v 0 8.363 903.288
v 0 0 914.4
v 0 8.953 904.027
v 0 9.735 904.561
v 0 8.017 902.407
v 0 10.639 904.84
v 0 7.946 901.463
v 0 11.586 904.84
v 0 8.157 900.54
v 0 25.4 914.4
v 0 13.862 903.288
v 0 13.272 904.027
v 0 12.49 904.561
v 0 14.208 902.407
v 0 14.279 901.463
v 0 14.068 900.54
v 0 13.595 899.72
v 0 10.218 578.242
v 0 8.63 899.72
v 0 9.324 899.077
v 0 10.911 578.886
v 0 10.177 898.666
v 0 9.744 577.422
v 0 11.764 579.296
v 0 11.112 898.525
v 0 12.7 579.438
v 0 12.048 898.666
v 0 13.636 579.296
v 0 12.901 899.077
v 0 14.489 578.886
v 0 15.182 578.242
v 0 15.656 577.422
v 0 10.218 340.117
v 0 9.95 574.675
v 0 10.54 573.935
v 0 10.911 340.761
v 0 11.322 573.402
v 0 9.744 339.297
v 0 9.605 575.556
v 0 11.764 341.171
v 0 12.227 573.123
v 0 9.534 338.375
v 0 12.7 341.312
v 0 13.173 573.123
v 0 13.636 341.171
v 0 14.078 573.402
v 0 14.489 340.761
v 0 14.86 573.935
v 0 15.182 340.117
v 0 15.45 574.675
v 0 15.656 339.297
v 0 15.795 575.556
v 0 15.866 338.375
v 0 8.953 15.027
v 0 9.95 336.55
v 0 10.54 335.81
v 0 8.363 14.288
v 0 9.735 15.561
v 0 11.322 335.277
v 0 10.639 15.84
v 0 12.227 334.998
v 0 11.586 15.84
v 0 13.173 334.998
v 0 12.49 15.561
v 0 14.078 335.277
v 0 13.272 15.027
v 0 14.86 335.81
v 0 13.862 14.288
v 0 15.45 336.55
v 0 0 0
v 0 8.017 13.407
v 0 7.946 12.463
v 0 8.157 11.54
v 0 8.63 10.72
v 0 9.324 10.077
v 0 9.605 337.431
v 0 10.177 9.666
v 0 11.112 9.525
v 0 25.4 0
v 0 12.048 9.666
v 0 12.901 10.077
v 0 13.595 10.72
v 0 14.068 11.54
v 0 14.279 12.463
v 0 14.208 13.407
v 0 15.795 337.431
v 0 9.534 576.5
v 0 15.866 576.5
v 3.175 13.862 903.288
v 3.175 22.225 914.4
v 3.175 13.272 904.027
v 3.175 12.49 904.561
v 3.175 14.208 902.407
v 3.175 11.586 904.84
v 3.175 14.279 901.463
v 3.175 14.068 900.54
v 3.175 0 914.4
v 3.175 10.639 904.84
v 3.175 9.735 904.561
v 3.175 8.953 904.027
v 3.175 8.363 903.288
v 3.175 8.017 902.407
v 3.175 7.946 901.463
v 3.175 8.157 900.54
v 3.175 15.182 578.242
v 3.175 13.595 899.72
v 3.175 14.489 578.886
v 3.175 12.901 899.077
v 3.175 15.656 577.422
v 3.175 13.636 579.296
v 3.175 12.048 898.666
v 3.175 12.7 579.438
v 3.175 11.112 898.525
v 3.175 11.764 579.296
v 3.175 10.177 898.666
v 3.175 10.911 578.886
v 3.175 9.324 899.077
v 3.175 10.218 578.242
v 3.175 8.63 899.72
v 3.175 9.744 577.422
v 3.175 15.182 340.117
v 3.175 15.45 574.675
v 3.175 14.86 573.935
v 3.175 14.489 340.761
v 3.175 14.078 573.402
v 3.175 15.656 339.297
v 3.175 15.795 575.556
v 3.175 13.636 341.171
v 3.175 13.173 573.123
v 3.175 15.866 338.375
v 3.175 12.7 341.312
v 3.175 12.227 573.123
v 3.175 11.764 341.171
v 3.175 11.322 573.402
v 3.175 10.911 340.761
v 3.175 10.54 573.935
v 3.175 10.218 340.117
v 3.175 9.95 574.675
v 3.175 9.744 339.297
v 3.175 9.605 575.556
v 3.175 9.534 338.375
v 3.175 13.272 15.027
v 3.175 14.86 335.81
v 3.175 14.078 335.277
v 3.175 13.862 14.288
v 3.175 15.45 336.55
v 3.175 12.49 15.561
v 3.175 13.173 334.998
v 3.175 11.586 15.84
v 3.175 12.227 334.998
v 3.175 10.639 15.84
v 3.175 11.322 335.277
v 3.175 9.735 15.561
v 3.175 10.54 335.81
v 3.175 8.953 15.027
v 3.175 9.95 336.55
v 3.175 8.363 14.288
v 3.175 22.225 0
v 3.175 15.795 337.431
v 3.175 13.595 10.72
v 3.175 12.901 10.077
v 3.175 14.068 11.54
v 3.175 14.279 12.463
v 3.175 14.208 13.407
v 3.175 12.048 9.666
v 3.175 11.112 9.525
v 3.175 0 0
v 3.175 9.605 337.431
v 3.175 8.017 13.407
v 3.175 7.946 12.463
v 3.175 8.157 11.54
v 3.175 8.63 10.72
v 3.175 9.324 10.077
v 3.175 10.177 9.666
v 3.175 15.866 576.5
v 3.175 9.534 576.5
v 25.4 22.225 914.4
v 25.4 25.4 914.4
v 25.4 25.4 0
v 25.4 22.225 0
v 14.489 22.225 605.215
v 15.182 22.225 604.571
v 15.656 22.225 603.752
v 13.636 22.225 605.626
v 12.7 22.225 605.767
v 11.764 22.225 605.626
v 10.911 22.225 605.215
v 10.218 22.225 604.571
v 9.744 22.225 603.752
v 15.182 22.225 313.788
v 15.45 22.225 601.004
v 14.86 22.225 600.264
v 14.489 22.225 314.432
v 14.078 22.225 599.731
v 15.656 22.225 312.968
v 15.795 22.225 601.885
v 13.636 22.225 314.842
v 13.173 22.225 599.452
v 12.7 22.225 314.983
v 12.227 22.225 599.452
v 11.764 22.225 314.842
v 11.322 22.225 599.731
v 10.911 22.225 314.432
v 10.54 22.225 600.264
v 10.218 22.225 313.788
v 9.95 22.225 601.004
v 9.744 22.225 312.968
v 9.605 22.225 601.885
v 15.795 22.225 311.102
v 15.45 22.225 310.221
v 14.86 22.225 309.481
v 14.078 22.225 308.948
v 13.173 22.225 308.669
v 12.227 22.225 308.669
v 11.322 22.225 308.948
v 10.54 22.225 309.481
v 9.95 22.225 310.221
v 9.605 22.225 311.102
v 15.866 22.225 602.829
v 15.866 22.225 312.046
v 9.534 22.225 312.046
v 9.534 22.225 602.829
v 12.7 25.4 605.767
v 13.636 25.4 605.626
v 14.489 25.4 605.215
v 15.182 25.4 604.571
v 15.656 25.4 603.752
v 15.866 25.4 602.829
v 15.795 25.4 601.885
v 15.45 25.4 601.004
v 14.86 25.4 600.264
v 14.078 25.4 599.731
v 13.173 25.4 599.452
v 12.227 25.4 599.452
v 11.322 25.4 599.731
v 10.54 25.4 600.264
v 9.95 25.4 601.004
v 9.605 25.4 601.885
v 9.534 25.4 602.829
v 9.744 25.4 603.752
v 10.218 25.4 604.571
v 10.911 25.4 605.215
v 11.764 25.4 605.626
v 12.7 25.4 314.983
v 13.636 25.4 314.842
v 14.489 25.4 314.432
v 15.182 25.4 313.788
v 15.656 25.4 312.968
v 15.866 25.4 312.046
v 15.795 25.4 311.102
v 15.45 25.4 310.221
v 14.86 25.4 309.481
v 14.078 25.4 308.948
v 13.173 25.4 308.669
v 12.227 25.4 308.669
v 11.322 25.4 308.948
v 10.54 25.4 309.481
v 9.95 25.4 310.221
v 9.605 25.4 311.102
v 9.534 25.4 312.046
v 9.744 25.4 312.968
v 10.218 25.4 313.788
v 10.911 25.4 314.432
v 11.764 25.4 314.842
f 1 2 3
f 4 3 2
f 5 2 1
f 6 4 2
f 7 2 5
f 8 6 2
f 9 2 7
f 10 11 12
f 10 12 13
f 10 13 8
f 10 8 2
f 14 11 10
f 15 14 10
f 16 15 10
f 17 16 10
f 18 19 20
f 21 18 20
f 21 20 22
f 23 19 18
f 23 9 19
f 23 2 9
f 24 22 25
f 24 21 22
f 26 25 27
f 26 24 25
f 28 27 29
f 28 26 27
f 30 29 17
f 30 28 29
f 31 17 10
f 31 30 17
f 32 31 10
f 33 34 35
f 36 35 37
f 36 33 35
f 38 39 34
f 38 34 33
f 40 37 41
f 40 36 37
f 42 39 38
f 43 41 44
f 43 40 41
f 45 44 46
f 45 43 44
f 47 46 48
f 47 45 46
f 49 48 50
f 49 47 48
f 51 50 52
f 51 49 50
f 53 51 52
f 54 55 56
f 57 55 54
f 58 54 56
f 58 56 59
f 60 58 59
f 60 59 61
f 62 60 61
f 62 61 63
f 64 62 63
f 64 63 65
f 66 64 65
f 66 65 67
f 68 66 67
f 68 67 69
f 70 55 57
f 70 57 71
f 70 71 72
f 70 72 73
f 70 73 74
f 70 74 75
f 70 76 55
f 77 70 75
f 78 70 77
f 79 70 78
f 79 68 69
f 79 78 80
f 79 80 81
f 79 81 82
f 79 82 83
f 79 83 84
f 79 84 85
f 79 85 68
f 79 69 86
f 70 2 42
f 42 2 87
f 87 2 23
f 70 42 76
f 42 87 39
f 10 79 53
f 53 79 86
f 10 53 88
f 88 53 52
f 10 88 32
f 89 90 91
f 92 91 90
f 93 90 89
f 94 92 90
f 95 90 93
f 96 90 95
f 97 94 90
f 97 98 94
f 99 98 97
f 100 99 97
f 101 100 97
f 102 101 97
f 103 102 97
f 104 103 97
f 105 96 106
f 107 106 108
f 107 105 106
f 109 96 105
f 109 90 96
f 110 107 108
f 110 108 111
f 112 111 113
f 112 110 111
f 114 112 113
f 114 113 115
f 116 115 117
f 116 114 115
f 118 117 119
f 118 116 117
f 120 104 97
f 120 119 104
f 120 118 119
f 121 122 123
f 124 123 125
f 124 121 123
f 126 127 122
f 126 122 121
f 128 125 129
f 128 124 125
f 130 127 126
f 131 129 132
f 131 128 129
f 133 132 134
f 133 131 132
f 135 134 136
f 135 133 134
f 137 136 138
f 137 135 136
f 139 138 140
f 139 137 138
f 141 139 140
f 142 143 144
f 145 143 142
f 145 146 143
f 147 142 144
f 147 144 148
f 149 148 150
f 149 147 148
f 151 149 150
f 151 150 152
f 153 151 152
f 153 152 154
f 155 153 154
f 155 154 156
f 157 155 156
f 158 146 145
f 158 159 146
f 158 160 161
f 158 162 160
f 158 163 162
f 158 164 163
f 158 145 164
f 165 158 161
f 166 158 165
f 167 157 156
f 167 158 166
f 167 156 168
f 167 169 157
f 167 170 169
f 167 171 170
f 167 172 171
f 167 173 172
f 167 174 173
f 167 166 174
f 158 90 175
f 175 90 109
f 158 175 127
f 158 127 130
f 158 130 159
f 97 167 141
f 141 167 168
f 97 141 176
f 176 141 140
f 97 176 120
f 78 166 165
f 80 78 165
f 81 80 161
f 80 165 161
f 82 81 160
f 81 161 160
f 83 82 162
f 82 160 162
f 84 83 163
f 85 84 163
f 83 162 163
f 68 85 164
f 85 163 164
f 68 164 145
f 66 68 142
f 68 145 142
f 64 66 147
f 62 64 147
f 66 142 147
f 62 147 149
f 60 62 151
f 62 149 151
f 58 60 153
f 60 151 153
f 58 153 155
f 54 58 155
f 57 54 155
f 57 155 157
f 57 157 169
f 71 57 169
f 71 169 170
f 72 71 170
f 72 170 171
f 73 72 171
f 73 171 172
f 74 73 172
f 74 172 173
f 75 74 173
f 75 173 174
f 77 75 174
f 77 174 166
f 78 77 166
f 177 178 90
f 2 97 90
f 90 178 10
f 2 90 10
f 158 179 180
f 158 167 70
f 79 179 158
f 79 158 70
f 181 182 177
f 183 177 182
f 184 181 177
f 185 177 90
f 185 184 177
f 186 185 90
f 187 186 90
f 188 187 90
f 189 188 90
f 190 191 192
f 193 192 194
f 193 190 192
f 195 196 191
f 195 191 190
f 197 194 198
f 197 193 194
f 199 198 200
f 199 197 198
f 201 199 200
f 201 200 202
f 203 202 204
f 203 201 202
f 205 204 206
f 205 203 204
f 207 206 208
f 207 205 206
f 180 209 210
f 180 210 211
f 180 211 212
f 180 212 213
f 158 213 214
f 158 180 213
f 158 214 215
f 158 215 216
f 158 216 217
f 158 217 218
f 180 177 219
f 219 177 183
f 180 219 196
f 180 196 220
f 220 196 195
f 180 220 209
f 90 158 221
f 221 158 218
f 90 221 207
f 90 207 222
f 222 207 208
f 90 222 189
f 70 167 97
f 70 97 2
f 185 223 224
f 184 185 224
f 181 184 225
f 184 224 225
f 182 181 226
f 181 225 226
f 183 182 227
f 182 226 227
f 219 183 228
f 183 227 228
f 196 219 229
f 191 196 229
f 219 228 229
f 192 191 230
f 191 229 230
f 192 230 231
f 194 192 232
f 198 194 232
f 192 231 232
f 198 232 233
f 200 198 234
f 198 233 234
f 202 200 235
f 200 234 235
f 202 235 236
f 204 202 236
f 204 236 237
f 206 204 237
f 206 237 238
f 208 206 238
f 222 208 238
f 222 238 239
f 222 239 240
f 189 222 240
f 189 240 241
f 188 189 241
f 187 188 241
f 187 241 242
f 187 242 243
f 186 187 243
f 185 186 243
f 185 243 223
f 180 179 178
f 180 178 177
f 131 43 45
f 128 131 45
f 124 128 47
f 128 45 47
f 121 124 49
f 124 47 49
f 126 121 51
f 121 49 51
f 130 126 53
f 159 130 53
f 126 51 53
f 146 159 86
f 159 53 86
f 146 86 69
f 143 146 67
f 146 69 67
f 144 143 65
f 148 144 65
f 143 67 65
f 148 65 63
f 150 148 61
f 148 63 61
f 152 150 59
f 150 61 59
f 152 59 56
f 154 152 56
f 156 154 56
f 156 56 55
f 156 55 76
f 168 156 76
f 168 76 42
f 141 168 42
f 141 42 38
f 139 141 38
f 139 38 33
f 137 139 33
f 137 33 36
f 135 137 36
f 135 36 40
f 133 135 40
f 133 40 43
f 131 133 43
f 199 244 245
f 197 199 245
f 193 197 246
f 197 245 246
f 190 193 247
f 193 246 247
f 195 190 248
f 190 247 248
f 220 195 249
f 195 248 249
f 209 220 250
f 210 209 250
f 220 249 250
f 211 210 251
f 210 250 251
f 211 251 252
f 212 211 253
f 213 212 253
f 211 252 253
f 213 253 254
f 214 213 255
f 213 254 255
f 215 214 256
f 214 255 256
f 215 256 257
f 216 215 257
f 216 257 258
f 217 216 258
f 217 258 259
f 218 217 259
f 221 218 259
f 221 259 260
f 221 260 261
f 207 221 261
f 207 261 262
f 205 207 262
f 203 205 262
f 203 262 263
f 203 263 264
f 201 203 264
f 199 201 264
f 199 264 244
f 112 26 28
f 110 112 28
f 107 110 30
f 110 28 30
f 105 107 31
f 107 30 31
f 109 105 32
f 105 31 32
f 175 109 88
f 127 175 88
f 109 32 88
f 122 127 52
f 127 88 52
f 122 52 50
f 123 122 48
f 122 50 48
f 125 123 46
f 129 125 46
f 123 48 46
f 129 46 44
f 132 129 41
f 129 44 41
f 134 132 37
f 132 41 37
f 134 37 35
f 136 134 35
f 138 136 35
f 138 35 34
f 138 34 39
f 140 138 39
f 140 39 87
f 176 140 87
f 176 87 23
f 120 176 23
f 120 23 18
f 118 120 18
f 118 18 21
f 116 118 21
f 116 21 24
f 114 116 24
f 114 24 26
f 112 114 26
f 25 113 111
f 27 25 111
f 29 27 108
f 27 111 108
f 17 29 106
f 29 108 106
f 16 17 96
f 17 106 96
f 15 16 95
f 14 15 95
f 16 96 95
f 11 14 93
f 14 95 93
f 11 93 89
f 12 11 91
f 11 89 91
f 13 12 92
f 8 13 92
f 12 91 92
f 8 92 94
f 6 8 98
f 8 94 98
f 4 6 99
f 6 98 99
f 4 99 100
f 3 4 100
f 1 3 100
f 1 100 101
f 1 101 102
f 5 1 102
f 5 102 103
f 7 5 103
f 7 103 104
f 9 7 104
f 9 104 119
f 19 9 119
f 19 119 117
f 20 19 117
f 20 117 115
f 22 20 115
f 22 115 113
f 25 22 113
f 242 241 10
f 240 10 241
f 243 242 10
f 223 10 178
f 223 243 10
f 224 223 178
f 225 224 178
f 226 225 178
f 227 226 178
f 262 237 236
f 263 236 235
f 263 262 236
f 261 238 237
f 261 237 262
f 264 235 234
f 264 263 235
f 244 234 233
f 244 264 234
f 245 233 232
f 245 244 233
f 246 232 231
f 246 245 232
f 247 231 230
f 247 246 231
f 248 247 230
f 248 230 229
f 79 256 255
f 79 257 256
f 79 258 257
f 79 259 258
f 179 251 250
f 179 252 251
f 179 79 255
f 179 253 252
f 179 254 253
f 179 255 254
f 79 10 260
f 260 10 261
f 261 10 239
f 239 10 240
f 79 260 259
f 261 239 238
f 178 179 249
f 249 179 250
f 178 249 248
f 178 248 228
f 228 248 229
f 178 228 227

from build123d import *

# Parameters (mm, degrees)
BOSS_EXTRUDE1_DEPTH = 914.4
SKETCH2_R           = 3.175
CUT_EXTRUDE1_DEPTH  = 914.4
SKETCH3_R           = 3.175
CUT_EXTRUDE2_DEPTH  = 916.10528356
CUT_EXTRUDE3_REACH  = 917.023
SKETCH4_R           = 3.175


with BuildPart() as part:
    # Sketch1 → Boss-Extrude1 (new body)
    with BuildSketch(Plane.XY):
        Polygon((0, 0), (0, 25.4), (25.4, 25.4), (25.4, 22.225), (3.175, 22.225), (3.175, 0), align=None)
    extrude(amount=BOSS_EXTRUDE1_DEPTH)

    # Sketch2 → Cut-Extrude1 (cut)
    with BuildSketch(Plane.ZY):
        with Locations((338.1375, 12.7)):
            Circle(SKETCH2_R)
        with Locations((576.2625, 12.7)):
            Circle(SKETCH2_R)
    extrude(amount=-CUT_EXTRUDE1_DEPTH, mode=Mode.SUBTRACT)

    # Sketch3 → Cut-Extrude2 (cut, through all)
    with BuildSketch(Plane(origin=(0, 25.4, 0), x_dir=(1, 0, 0), z_dir=(0, 1, 0))):
        with Locations(Location((12.7, -602.591710243, 0), (0, 0, 270))):
            Circle(SKETCH3_R)
        with Locations(Location((12.7, -311.808289757, 0), (0, 0, 270))):
            Circle(SKETCH3_R)
    extrude(amount=-CUT_EXTRUDE2_DEPTH, mode=Mode.SUBTRACT)

    # Sketch4 → Cut-Extrude3 (cut, up to next)
    with BuildSketch(Plane(origin=(3.175, 0, 0), x_dir=(0, 0, -1), z_dir=(1, 0, 0)), mode=Mode.PRIVATE) as cut_extrude3_sk1:
        with Locations((-901.7, 11.1125)):
            Circle(SKETCH4_R)
    cut_extrude3_tool1 = extrude(cut_extrude3_sk1.sketch, amount=-CUT_EXTRUDE3_REACH, mode=Mode.PRIVATE) & part.part
    # Sketch4 → Cut-Extrude3 (cut, up to next)
    with BuildSketch(Plane(origin=(3.175, 0, 0), x_dir=(0, 0, -1), z_dir=(1, 0, 0)), mode=Mode.PRIVATE) as cut_extrude3_sk2:
        with Locations((-12.7, 11.1125)):
            Circle(SKETCH4_R)
    cut_extrude3_tool2 = extrude(cut_extrude3_sk2.sketch, amount=-CUT_EXTRUDE3_REACH, mode=Mode.PRIVATE) & part.part
    add(cut_extrude3_tool1.solids().sort_by_distance((3.175, 11.1125, 901.7))[0], mode=Mode.SUBTRACT)
    add(cut_extrude3_tool2.solids().sort_by_distance((3.175, 11.1125, 12.7))[0], mode=Mode.SUBTRACT)


solid = part.part
